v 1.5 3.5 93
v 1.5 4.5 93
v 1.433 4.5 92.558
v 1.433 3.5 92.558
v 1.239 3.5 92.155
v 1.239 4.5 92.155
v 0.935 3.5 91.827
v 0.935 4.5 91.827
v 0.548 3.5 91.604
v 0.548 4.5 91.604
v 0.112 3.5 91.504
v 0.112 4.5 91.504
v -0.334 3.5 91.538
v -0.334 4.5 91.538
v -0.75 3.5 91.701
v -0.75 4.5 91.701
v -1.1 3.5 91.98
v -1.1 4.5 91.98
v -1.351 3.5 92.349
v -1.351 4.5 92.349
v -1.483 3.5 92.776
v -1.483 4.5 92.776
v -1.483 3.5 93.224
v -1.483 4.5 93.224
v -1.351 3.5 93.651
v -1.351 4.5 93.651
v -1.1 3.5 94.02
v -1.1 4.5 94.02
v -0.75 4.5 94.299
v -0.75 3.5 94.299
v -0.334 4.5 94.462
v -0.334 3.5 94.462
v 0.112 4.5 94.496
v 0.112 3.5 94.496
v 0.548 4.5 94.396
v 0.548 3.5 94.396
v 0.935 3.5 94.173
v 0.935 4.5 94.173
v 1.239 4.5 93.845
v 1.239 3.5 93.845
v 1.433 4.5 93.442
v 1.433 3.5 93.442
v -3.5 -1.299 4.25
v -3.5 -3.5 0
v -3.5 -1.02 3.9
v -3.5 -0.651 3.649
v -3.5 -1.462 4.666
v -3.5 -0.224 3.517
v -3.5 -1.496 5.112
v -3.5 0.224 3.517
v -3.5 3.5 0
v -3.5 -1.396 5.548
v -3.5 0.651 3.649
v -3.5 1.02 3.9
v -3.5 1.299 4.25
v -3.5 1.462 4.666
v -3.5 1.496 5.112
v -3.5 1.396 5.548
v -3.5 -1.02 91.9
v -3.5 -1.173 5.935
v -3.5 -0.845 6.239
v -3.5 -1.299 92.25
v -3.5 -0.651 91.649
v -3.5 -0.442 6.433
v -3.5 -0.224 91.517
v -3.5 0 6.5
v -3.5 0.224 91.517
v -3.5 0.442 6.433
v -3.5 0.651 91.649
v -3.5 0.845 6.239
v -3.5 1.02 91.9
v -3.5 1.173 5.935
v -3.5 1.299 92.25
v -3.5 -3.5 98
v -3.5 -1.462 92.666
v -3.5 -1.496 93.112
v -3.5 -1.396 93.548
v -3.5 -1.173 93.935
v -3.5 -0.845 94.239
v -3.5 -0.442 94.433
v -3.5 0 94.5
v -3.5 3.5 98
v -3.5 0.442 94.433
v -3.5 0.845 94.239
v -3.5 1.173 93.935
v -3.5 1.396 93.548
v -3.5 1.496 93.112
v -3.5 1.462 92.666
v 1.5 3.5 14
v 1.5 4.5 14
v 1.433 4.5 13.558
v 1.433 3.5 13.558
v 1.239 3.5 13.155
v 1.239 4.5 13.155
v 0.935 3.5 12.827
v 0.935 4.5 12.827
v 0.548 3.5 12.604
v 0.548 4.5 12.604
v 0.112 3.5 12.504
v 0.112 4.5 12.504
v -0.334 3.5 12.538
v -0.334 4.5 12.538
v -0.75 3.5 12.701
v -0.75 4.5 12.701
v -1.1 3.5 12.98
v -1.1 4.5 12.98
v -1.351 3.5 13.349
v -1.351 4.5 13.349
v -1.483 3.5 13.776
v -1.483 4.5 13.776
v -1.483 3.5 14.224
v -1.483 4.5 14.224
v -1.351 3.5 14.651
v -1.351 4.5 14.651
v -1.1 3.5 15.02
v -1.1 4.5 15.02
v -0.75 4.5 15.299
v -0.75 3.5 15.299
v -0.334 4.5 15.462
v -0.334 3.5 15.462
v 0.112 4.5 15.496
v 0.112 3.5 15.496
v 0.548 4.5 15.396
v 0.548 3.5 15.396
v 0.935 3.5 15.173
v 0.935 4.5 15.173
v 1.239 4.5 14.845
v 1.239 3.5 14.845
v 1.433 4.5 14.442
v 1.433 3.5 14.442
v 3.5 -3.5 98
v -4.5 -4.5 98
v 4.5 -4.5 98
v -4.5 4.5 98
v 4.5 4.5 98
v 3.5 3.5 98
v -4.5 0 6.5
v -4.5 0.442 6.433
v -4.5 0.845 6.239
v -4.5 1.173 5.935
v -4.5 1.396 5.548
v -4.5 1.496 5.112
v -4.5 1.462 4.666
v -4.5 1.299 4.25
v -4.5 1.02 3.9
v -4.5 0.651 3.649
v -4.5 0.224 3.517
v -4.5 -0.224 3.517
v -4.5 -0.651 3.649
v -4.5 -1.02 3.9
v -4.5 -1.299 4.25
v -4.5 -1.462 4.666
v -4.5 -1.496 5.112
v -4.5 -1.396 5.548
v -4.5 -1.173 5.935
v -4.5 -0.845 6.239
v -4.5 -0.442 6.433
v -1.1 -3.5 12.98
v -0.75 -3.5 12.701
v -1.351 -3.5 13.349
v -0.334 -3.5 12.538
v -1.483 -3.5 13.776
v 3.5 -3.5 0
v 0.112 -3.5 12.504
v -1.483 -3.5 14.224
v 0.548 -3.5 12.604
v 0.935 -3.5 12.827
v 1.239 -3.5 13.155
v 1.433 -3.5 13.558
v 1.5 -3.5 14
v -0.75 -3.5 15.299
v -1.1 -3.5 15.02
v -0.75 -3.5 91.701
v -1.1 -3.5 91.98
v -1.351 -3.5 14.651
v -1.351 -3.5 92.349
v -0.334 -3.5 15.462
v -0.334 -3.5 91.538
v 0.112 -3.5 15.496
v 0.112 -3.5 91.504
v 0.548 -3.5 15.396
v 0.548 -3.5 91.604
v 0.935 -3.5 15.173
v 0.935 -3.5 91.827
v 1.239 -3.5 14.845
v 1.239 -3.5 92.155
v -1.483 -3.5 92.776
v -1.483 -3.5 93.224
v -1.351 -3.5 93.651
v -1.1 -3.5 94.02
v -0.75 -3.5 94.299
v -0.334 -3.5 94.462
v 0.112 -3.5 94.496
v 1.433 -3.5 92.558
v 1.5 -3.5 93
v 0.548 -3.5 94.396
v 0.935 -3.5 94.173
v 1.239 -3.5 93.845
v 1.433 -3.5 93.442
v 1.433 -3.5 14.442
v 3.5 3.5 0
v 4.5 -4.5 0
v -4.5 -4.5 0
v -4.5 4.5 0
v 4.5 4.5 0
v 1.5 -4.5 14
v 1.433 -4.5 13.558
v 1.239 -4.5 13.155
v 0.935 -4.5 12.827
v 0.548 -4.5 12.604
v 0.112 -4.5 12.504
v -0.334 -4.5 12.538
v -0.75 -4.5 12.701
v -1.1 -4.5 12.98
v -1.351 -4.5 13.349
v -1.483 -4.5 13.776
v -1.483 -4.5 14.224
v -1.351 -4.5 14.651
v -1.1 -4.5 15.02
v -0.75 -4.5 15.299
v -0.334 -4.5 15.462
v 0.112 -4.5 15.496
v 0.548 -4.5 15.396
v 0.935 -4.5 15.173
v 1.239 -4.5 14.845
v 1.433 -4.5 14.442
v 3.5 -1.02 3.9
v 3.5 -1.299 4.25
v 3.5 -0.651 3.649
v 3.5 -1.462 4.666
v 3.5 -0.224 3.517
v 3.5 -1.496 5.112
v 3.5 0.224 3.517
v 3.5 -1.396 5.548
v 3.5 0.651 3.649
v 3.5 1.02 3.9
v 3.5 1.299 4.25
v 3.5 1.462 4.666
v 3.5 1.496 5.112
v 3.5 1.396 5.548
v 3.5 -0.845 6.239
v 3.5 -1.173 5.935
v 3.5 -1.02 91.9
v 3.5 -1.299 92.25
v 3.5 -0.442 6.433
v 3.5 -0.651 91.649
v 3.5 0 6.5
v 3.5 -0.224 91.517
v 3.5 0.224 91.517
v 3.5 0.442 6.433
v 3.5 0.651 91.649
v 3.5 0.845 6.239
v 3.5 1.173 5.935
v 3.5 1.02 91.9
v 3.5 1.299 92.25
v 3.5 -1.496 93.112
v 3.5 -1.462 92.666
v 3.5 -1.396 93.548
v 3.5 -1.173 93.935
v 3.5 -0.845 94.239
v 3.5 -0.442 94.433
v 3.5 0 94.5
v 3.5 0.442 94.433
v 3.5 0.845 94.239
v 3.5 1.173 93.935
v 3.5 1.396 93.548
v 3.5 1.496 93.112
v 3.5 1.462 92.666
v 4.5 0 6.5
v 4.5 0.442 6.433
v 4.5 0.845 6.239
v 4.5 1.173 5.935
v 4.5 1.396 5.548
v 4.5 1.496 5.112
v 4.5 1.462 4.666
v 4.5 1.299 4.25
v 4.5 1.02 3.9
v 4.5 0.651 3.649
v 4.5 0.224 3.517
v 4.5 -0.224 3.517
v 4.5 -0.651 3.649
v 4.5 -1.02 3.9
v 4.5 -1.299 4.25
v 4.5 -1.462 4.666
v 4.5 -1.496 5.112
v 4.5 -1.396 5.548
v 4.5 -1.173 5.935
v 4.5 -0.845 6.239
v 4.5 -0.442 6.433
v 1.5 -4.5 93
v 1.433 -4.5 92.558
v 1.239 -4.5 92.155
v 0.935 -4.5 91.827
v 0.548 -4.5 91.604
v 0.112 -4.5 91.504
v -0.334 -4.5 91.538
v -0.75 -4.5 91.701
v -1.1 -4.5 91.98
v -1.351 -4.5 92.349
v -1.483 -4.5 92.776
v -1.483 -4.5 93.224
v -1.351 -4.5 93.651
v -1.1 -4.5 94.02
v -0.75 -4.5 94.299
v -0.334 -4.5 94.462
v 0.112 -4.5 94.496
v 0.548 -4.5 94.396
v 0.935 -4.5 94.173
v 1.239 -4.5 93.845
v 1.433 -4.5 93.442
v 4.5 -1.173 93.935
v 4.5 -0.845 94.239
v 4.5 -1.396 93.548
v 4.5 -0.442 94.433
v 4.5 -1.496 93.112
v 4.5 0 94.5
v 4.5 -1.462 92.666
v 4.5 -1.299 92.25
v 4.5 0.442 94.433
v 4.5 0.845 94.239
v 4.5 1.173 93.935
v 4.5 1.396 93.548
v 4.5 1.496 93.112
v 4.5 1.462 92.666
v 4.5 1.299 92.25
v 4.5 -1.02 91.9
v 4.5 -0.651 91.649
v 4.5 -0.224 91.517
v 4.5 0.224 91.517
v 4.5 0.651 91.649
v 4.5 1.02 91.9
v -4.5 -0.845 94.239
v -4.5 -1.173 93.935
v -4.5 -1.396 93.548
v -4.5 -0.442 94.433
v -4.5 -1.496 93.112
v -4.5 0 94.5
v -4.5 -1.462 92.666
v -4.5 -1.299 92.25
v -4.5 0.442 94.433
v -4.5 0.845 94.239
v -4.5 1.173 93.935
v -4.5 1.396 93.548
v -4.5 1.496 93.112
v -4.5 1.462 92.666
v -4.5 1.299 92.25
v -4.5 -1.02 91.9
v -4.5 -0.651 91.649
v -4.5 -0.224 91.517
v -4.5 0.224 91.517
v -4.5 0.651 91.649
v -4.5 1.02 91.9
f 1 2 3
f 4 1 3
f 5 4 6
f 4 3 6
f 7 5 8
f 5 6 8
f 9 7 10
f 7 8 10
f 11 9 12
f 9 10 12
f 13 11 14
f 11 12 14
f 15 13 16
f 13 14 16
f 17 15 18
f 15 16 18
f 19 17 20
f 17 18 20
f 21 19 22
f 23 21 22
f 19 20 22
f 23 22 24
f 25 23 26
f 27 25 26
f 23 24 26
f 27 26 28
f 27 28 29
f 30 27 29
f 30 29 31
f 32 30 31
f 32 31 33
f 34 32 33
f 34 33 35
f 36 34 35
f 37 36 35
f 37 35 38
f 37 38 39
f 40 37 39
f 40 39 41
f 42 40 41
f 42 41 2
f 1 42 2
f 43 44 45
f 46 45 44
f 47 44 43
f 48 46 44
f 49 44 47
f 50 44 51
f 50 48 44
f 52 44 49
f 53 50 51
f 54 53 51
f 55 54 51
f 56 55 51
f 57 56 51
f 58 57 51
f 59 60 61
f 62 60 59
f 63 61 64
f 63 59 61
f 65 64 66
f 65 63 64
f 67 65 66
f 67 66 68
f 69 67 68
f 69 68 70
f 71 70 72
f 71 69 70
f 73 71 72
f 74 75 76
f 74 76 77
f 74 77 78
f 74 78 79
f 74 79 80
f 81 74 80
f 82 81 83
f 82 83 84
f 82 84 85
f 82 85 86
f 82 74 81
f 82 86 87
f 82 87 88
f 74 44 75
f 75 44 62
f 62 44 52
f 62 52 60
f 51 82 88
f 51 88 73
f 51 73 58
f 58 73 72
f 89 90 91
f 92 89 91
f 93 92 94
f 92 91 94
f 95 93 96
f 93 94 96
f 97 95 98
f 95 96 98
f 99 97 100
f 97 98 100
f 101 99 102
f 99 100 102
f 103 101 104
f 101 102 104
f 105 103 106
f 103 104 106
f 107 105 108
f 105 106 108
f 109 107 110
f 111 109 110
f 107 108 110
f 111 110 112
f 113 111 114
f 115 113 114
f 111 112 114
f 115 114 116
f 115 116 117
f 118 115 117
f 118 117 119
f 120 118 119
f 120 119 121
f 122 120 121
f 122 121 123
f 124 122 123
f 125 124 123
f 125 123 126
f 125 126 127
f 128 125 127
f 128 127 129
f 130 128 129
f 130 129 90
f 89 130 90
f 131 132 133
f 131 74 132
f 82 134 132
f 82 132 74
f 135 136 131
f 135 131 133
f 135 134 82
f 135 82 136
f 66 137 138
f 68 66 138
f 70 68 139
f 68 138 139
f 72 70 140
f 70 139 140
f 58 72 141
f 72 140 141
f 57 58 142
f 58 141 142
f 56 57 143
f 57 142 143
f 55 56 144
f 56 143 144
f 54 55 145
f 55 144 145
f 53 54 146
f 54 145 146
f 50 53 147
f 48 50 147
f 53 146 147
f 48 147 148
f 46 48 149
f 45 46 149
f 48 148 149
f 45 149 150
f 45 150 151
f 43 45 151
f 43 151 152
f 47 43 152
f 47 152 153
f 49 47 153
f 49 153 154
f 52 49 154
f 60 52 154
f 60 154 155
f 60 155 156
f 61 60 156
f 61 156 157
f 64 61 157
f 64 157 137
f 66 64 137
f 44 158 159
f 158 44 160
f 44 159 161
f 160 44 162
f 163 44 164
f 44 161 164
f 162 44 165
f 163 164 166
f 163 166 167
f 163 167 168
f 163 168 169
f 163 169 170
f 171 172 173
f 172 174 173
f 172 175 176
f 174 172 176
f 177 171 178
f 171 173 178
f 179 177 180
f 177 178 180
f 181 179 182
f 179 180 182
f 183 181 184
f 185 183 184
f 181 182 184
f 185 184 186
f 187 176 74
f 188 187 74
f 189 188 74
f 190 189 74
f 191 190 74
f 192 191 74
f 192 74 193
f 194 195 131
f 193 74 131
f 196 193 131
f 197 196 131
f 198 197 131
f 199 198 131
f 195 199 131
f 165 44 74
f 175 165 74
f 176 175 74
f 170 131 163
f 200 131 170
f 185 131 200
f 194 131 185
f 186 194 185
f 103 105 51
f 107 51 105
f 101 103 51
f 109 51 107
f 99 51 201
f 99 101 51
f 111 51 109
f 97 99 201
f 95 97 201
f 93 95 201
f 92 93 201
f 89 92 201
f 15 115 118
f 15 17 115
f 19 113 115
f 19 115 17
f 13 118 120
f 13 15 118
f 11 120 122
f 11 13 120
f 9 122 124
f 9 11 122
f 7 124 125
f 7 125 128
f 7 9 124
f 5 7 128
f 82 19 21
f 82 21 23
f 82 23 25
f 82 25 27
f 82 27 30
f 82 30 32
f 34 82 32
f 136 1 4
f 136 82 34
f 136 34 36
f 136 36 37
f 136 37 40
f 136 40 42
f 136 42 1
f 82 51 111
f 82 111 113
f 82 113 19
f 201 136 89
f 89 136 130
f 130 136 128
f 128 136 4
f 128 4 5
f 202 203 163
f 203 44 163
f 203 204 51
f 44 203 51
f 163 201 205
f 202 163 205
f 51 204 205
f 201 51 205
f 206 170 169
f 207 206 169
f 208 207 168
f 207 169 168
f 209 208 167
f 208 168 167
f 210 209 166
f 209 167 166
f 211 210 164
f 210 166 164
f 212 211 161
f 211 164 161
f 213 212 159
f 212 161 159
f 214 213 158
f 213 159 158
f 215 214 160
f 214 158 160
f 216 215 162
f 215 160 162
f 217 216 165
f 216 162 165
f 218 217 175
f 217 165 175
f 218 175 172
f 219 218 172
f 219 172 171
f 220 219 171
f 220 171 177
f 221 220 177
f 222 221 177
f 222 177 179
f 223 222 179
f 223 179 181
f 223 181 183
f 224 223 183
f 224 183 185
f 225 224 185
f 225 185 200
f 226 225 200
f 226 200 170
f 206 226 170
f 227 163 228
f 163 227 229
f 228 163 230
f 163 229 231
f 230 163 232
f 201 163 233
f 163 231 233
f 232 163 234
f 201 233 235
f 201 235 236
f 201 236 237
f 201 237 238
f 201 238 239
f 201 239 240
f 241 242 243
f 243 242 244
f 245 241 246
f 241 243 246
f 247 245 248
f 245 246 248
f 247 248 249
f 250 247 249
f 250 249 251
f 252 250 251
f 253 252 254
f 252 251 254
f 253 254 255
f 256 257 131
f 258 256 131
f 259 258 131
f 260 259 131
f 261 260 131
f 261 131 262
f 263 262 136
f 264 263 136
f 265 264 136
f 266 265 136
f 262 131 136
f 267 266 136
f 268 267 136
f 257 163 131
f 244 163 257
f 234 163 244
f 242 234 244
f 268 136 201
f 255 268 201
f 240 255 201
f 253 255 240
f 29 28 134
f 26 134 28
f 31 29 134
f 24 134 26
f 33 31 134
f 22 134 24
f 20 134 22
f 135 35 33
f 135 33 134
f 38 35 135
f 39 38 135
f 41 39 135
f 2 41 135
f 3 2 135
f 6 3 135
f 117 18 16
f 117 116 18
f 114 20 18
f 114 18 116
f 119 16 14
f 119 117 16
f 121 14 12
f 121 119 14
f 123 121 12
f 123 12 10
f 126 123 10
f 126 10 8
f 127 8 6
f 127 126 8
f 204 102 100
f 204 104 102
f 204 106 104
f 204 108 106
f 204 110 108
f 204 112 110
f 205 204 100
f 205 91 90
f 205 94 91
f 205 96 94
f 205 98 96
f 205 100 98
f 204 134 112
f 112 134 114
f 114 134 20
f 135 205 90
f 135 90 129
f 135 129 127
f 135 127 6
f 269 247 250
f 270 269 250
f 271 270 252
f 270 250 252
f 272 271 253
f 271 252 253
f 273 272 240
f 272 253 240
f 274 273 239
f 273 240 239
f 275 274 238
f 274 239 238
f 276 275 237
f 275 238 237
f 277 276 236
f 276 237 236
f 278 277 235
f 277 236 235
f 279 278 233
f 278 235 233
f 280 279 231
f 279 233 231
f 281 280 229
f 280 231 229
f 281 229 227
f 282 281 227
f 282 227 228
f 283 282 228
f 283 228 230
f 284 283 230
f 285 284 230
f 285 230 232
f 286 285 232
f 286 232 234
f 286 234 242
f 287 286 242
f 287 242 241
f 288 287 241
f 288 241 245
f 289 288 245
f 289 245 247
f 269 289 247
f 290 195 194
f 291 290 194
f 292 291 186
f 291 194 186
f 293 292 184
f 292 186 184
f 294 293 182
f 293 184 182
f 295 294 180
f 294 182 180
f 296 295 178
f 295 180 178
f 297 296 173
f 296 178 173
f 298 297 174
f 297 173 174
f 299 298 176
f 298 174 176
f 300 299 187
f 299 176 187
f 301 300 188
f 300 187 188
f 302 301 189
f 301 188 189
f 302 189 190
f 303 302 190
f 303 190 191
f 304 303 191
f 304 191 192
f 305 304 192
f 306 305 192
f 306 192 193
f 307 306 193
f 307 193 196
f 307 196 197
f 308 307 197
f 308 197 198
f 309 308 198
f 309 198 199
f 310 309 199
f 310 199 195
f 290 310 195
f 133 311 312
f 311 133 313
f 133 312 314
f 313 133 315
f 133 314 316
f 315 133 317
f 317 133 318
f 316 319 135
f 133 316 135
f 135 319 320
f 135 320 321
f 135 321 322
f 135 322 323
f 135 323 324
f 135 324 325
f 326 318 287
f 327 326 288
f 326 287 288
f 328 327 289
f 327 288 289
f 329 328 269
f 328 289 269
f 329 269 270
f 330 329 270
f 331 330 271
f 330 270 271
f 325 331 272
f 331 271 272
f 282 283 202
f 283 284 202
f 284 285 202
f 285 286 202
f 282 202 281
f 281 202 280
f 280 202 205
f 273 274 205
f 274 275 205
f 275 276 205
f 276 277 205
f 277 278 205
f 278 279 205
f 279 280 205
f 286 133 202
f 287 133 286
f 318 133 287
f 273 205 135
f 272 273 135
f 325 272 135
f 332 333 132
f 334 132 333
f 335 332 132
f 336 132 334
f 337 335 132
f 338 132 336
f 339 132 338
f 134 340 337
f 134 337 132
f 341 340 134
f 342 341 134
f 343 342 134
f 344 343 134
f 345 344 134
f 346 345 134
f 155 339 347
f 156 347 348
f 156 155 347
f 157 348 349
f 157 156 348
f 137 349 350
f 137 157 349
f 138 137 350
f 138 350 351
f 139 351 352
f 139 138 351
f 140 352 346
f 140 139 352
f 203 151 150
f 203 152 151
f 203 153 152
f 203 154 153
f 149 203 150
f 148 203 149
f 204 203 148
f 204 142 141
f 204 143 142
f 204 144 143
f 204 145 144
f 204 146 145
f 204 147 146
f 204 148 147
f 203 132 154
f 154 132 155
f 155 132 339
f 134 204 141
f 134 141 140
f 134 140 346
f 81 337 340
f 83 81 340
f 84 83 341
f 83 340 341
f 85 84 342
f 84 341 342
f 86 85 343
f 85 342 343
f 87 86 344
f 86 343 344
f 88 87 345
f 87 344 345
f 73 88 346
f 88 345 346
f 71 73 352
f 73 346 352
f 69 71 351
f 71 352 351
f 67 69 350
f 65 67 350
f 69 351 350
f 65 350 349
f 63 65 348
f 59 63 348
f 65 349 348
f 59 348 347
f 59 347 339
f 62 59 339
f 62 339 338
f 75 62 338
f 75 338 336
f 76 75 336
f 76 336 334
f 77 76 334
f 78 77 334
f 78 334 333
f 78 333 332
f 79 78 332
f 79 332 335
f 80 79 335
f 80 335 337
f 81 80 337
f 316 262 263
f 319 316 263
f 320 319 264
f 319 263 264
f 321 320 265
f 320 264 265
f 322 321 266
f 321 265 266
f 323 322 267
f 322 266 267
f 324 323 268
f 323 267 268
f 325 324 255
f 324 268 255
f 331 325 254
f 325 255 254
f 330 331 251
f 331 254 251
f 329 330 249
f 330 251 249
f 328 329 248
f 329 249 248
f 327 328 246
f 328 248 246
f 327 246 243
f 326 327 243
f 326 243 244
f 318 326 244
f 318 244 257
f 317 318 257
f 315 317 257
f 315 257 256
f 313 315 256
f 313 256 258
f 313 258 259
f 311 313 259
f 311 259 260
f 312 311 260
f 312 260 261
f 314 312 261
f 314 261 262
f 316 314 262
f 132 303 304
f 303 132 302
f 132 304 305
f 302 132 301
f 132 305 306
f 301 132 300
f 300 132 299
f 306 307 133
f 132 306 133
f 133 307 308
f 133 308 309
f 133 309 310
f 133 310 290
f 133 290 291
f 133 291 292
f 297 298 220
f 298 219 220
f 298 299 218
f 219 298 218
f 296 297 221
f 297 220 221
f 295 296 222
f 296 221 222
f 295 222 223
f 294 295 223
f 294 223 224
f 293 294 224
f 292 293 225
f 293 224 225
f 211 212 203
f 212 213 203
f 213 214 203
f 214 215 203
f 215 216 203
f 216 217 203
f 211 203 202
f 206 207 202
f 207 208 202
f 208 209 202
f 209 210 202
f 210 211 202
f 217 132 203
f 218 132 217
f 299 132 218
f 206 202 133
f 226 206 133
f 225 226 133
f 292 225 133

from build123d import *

# Parameters (mm, degrees)
SKETCH_1_W          = 9
SKETCH_1_H          = 9
EXTRUDE_1_DEPTH     = 98
SKETCH_2_W          = 7
SKETCH_2_H          = 7
CUT_EXTRUDE_1_DEPTH = 106.6
SKETCH_3_R          = 1.5
CUT_EXTRUDE_2_DEPTH = 106.6
SKETCH_4_R          = 1.5
CUT_EXTRUDE_4_DEPTH = 50


with BuildPart() as part:
    # ｽｹｯﾁ1 → ﾎﾞｽ - 押し出し1 (new body)
    with BuildSketch(Plane.XY):
        Rectangle(SKETCH_1_W, SKETCH_1_H)
    extrude(amount=EXTRUDE_1_DEPTH)

    # ｽｹｯﾁ2 → ｶｯﾄ - 押し出し1 (cut)
    with BuildSketch(Plane.XY.offset(98)):
        Rectangle(SKETCH_2_W, SKETCH_2_H)
    extrude(amount=-CUT_EXTRUDE_1_DEPTH, mode=Mode.SUBTRACT)

    # ｽｹｯﾁ3 → ｶｯﾄ - 押し出し2 (cut)
    with BuildSketch(Plane(origin=(0, 4.5, 0), x_dir=(1, 0, 0), z_dir=(0, 1, 0))):
        with Locations((0, -93)):
            Circle(SKETCH_3_R)
        with Locations((0, -14)):
            Circle(SKETCH_3_R)
    extrude(amount=-CUT_EXTRUDE_2_DEPTH, mode=Mode.SUBTRACT)

    # ｽｹｯﾁ4 → ｶｯﾄ - 押し出し4 (cut)
    with BuildSketch(Plane.ZY.offset(4.5)):
        with Locations((5, 0)):
            Circle(SKETCH_4_R)
        with Locations((93, 0)):
            Circle(SKETCH_4_R)
    extrude(amount=-CUT_EXTRUDE_4_DEPTH, mode=Mode.SUBTRACT)


solid = part.part
